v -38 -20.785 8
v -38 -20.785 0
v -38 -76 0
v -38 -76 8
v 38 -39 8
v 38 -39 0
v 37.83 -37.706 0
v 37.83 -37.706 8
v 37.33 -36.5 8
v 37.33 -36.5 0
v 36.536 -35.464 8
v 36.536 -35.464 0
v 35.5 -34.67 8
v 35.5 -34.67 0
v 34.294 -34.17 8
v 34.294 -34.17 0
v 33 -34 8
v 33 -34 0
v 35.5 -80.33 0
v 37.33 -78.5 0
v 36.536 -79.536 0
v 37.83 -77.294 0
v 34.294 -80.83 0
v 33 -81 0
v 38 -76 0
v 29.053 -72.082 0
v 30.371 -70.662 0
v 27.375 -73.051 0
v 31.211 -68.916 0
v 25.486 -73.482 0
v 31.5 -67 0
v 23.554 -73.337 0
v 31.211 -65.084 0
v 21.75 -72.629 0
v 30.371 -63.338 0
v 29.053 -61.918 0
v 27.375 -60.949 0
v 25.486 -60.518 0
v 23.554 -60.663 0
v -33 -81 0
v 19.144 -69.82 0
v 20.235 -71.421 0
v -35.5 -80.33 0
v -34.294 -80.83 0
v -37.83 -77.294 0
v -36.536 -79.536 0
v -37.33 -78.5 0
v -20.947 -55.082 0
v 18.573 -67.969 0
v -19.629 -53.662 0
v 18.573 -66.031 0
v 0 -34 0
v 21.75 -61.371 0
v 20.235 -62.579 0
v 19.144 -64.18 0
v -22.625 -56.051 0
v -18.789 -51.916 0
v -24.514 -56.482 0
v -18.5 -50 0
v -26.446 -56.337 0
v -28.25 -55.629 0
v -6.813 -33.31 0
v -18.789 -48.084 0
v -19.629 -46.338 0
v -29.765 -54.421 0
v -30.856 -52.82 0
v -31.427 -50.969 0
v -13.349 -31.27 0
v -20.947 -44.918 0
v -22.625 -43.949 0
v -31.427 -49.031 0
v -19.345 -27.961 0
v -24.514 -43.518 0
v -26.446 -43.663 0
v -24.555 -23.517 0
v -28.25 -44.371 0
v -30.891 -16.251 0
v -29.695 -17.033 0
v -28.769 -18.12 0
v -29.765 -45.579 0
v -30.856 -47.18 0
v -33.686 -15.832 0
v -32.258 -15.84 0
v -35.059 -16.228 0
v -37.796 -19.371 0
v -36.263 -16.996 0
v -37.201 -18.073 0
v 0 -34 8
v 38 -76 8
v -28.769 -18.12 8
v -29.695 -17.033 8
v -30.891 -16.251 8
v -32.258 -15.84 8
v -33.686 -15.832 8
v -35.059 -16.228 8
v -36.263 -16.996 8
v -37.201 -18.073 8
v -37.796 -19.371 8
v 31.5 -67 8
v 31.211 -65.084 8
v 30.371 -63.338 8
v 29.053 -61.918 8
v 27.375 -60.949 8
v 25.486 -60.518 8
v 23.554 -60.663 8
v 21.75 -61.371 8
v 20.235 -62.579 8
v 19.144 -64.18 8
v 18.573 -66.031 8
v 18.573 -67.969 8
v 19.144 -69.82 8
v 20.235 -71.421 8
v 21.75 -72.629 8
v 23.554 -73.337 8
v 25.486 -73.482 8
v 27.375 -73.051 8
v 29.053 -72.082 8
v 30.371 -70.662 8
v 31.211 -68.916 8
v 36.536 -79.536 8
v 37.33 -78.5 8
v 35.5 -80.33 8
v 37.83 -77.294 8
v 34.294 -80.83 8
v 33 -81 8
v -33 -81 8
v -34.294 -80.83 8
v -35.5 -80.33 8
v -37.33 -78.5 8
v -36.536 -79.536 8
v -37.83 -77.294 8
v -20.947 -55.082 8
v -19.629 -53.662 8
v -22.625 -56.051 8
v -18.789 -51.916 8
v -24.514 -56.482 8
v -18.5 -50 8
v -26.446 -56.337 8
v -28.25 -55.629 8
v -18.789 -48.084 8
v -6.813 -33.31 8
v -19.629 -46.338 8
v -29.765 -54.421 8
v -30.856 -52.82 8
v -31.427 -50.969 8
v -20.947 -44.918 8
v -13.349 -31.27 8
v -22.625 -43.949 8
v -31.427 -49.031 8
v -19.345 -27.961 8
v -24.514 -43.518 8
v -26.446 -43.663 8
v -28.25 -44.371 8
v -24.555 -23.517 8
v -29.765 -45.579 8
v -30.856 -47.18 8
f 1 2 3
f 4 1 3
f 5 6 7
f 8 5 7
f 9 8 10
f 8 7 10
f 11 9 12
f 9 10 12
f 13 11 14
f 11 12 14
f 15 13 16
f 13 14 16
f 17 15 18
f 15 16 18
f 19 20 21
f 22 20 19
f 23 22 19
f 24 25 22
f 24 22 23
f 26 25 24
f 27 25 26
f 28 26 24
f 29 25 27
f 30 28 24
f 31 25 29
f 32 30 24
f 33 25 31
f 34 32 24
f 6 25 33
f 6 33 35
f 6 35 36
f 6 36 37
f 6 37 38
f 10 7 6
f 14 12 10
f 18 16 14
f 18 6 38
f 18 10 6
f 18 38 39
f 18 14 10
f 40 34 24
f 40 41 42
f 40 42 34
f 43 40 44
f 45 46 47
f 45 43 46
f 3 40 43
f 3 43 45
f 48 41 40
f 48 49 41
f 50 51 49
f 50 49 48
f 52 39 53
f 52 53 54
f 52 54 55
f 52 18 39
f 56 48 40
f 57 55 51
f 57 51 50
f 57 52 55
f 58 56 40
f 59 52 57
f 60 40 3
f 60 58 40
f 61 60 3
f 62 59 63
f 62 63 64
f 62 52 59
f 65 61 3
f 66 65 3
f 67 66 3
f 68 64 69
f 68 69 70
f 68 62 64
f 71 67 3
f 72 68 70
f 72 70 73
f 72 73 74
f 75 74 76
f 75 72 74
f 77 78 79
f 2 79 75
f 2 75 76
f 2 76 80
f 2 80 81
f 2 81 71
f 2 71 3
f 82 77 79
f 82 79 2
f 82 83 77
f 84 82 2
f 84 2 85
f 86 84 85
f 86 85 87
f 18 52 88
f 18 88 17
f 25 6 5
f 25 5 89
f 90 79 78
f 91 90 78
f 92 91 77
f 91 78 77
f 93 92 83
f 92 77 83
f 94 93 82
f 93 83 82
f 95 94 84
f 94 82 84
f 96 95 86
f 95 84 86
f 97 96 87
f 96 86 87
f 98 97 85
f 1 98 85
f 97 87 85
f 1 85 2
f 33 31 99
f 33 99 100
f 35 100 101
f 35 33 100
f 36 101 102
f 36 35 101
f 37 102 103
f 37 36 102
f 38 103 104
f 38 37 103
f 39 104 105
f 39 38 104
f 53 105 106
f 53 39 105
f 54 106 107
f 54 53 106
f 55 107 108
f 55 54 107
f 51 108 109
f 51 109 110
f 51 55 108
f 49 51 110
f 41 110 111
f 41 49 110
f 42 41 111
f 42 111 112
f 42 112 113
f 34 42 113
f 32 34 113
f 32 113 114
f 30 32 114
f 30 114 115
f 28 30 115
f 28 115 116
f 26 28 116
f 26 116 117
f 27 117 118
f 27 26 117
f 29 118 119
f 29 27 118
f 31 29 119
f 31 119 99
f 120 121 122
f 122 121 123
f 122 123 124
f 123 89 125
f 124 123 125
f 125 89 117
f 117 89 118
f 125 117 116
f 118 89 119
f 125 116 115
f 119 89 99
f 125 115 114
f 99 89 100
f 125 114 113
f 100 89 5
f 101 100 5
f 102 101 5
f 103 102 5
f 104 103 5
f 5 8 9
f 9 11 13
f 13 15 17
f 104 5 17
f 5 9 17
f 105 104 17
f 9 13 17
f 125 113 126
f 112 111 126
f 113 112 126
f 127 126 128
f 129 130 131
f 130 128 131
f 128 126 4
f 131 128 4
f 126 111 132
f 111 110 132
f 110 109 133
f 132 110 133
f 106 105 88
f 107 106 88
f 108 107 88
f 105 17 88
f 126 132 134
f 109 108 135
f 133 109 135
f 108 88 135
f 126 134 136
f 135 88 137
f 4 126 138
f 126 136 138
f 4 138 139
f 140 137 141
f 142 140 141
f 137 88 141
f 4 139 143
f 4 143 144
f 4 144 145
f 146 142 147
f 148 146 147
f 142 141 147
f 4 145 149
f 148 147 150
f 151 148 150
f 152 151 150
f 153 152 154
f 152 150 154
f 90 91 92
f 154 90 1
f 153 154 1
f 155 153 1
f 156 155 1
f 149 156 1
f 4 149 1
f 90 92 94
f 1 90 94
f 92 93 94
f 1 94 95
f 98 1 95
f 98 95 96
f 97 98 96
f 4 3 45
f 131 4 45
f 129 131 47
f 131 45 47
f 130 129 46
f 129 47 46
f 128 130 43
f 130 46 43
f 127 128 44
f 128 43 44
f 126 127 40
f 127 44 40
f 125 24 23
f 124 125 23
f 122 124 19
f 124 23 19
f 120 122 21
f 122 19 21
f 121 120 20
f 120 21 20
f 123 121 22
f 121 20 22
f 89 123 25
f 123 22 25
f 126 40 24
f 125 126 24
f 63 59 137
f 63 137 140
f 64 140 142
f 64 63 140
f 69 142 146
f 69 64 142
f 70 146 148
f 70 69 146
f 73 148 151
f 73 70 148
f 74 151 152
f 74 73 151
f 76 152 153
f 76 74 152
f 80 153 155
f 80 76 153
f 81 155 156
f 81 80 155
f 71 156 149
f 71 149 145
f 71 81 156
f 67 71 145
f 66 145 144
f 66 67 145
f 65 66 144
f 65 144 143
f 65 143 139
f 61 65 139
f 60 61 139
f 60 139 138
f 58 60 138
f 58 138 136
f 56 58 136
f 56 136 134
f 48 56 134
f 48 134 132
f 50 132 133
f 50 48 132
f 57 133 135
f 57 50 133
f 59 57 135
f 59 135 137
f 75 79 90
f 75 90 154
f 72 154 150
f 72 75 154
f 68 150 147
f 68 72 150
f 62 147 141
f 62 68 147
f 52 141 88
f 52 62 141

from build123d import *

# Parameters (mm, degrees)
SKETCH_R  = 6.5
PAD_DEPTH = 8


with BuildPart() as part:
    # Sketch → Pad (new body)
    with BuildSketch(Plane.XY):
        with BuildLine():
            ThreePointArc((-28.769231, -18.119916), (-16.430503, -29.7664), (0, -34))
            Line((0, -34), (33, -34))
            ThreePointArc((38, -39), (36.535534, -35.464466), (33, -34))
            Line((38, -39), (38, -76))
            ThreePointArc((33, -81), (36.535534, -79.535534), (38, -76))
            Line((-33, -81), (33, -81))
            ThreePointArc((-38, -76), (-36.535534, -79.535534), (-33, -81))
            Line((-38, -20.78461), (-38, -76))
            ThreePointArc((-28.769231, -18.119916), (-34.38675, -15.980765), (-38, -20.78461))
        make_face()
        with Locations((-25, -50)):
            Circle(SKETCH_R, mode=Mode.SUBTRACT)
        with Locations((25, -67)):
            Circle(SKETCH_R, mode=Mode.SUBTRACT)
    extrude(amount=PAD_DEPTH)


solid = part.part
